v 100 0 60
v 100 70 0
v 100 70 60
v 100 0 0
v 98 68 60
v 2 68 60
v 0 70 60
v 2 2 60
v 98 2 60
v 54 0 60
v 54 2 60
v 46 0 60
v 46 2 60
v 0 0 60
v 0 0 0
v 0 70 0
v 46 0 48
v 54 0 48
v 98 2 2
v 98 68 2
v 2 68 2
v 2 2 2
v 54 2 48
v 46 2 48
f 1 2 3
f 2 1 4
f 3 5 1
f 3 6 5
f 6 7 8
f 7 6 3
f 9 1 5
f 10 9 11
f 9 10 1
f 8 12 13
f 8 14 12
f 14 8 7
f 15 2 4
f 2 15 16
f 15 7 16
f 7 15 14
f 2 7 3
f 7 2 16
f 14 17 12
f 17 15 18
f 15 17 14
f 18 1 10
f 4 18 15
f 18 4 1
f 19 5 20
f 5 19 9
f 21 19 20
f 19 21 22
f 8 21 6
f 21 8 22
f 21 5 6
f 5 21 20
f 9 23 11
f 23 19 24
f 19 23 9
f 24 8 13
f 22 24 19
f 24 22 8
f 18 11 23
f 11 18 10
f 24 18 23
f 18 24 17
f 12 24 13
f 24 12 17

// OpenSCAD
$fn = 32;

// ----------------------------------------------------------------------
// Enclosure box: notch enclosure
// ----------------------------------------------------------------------

// --- parameters (mm) ---
box_l = 100;              // outer length, X
box_w = 70;               // outer width, Y
box_h = 60;               // outer height
wall_t = 2;               // wall thickness
notch_w = 8;              // cable notch width
notch_h = 12;             // cable notch height

inner_h = box_h - wall_t;  // cavity depth
boss_h = inner_h - 2;  // corner boss height

difference() {
  cube([box_l, box_w, box_h]);
  translate([wall_t, wall_t, wall_t])
    cube([box_l - 2 * wall_t, box_w - 2 * wall_t, box_h]);
  translate([box_l / 2 - notch_w / 2, -1, box_h - notch_h])
    cube([notch_w, wall_t + 2, notch_h + 1]);
}
